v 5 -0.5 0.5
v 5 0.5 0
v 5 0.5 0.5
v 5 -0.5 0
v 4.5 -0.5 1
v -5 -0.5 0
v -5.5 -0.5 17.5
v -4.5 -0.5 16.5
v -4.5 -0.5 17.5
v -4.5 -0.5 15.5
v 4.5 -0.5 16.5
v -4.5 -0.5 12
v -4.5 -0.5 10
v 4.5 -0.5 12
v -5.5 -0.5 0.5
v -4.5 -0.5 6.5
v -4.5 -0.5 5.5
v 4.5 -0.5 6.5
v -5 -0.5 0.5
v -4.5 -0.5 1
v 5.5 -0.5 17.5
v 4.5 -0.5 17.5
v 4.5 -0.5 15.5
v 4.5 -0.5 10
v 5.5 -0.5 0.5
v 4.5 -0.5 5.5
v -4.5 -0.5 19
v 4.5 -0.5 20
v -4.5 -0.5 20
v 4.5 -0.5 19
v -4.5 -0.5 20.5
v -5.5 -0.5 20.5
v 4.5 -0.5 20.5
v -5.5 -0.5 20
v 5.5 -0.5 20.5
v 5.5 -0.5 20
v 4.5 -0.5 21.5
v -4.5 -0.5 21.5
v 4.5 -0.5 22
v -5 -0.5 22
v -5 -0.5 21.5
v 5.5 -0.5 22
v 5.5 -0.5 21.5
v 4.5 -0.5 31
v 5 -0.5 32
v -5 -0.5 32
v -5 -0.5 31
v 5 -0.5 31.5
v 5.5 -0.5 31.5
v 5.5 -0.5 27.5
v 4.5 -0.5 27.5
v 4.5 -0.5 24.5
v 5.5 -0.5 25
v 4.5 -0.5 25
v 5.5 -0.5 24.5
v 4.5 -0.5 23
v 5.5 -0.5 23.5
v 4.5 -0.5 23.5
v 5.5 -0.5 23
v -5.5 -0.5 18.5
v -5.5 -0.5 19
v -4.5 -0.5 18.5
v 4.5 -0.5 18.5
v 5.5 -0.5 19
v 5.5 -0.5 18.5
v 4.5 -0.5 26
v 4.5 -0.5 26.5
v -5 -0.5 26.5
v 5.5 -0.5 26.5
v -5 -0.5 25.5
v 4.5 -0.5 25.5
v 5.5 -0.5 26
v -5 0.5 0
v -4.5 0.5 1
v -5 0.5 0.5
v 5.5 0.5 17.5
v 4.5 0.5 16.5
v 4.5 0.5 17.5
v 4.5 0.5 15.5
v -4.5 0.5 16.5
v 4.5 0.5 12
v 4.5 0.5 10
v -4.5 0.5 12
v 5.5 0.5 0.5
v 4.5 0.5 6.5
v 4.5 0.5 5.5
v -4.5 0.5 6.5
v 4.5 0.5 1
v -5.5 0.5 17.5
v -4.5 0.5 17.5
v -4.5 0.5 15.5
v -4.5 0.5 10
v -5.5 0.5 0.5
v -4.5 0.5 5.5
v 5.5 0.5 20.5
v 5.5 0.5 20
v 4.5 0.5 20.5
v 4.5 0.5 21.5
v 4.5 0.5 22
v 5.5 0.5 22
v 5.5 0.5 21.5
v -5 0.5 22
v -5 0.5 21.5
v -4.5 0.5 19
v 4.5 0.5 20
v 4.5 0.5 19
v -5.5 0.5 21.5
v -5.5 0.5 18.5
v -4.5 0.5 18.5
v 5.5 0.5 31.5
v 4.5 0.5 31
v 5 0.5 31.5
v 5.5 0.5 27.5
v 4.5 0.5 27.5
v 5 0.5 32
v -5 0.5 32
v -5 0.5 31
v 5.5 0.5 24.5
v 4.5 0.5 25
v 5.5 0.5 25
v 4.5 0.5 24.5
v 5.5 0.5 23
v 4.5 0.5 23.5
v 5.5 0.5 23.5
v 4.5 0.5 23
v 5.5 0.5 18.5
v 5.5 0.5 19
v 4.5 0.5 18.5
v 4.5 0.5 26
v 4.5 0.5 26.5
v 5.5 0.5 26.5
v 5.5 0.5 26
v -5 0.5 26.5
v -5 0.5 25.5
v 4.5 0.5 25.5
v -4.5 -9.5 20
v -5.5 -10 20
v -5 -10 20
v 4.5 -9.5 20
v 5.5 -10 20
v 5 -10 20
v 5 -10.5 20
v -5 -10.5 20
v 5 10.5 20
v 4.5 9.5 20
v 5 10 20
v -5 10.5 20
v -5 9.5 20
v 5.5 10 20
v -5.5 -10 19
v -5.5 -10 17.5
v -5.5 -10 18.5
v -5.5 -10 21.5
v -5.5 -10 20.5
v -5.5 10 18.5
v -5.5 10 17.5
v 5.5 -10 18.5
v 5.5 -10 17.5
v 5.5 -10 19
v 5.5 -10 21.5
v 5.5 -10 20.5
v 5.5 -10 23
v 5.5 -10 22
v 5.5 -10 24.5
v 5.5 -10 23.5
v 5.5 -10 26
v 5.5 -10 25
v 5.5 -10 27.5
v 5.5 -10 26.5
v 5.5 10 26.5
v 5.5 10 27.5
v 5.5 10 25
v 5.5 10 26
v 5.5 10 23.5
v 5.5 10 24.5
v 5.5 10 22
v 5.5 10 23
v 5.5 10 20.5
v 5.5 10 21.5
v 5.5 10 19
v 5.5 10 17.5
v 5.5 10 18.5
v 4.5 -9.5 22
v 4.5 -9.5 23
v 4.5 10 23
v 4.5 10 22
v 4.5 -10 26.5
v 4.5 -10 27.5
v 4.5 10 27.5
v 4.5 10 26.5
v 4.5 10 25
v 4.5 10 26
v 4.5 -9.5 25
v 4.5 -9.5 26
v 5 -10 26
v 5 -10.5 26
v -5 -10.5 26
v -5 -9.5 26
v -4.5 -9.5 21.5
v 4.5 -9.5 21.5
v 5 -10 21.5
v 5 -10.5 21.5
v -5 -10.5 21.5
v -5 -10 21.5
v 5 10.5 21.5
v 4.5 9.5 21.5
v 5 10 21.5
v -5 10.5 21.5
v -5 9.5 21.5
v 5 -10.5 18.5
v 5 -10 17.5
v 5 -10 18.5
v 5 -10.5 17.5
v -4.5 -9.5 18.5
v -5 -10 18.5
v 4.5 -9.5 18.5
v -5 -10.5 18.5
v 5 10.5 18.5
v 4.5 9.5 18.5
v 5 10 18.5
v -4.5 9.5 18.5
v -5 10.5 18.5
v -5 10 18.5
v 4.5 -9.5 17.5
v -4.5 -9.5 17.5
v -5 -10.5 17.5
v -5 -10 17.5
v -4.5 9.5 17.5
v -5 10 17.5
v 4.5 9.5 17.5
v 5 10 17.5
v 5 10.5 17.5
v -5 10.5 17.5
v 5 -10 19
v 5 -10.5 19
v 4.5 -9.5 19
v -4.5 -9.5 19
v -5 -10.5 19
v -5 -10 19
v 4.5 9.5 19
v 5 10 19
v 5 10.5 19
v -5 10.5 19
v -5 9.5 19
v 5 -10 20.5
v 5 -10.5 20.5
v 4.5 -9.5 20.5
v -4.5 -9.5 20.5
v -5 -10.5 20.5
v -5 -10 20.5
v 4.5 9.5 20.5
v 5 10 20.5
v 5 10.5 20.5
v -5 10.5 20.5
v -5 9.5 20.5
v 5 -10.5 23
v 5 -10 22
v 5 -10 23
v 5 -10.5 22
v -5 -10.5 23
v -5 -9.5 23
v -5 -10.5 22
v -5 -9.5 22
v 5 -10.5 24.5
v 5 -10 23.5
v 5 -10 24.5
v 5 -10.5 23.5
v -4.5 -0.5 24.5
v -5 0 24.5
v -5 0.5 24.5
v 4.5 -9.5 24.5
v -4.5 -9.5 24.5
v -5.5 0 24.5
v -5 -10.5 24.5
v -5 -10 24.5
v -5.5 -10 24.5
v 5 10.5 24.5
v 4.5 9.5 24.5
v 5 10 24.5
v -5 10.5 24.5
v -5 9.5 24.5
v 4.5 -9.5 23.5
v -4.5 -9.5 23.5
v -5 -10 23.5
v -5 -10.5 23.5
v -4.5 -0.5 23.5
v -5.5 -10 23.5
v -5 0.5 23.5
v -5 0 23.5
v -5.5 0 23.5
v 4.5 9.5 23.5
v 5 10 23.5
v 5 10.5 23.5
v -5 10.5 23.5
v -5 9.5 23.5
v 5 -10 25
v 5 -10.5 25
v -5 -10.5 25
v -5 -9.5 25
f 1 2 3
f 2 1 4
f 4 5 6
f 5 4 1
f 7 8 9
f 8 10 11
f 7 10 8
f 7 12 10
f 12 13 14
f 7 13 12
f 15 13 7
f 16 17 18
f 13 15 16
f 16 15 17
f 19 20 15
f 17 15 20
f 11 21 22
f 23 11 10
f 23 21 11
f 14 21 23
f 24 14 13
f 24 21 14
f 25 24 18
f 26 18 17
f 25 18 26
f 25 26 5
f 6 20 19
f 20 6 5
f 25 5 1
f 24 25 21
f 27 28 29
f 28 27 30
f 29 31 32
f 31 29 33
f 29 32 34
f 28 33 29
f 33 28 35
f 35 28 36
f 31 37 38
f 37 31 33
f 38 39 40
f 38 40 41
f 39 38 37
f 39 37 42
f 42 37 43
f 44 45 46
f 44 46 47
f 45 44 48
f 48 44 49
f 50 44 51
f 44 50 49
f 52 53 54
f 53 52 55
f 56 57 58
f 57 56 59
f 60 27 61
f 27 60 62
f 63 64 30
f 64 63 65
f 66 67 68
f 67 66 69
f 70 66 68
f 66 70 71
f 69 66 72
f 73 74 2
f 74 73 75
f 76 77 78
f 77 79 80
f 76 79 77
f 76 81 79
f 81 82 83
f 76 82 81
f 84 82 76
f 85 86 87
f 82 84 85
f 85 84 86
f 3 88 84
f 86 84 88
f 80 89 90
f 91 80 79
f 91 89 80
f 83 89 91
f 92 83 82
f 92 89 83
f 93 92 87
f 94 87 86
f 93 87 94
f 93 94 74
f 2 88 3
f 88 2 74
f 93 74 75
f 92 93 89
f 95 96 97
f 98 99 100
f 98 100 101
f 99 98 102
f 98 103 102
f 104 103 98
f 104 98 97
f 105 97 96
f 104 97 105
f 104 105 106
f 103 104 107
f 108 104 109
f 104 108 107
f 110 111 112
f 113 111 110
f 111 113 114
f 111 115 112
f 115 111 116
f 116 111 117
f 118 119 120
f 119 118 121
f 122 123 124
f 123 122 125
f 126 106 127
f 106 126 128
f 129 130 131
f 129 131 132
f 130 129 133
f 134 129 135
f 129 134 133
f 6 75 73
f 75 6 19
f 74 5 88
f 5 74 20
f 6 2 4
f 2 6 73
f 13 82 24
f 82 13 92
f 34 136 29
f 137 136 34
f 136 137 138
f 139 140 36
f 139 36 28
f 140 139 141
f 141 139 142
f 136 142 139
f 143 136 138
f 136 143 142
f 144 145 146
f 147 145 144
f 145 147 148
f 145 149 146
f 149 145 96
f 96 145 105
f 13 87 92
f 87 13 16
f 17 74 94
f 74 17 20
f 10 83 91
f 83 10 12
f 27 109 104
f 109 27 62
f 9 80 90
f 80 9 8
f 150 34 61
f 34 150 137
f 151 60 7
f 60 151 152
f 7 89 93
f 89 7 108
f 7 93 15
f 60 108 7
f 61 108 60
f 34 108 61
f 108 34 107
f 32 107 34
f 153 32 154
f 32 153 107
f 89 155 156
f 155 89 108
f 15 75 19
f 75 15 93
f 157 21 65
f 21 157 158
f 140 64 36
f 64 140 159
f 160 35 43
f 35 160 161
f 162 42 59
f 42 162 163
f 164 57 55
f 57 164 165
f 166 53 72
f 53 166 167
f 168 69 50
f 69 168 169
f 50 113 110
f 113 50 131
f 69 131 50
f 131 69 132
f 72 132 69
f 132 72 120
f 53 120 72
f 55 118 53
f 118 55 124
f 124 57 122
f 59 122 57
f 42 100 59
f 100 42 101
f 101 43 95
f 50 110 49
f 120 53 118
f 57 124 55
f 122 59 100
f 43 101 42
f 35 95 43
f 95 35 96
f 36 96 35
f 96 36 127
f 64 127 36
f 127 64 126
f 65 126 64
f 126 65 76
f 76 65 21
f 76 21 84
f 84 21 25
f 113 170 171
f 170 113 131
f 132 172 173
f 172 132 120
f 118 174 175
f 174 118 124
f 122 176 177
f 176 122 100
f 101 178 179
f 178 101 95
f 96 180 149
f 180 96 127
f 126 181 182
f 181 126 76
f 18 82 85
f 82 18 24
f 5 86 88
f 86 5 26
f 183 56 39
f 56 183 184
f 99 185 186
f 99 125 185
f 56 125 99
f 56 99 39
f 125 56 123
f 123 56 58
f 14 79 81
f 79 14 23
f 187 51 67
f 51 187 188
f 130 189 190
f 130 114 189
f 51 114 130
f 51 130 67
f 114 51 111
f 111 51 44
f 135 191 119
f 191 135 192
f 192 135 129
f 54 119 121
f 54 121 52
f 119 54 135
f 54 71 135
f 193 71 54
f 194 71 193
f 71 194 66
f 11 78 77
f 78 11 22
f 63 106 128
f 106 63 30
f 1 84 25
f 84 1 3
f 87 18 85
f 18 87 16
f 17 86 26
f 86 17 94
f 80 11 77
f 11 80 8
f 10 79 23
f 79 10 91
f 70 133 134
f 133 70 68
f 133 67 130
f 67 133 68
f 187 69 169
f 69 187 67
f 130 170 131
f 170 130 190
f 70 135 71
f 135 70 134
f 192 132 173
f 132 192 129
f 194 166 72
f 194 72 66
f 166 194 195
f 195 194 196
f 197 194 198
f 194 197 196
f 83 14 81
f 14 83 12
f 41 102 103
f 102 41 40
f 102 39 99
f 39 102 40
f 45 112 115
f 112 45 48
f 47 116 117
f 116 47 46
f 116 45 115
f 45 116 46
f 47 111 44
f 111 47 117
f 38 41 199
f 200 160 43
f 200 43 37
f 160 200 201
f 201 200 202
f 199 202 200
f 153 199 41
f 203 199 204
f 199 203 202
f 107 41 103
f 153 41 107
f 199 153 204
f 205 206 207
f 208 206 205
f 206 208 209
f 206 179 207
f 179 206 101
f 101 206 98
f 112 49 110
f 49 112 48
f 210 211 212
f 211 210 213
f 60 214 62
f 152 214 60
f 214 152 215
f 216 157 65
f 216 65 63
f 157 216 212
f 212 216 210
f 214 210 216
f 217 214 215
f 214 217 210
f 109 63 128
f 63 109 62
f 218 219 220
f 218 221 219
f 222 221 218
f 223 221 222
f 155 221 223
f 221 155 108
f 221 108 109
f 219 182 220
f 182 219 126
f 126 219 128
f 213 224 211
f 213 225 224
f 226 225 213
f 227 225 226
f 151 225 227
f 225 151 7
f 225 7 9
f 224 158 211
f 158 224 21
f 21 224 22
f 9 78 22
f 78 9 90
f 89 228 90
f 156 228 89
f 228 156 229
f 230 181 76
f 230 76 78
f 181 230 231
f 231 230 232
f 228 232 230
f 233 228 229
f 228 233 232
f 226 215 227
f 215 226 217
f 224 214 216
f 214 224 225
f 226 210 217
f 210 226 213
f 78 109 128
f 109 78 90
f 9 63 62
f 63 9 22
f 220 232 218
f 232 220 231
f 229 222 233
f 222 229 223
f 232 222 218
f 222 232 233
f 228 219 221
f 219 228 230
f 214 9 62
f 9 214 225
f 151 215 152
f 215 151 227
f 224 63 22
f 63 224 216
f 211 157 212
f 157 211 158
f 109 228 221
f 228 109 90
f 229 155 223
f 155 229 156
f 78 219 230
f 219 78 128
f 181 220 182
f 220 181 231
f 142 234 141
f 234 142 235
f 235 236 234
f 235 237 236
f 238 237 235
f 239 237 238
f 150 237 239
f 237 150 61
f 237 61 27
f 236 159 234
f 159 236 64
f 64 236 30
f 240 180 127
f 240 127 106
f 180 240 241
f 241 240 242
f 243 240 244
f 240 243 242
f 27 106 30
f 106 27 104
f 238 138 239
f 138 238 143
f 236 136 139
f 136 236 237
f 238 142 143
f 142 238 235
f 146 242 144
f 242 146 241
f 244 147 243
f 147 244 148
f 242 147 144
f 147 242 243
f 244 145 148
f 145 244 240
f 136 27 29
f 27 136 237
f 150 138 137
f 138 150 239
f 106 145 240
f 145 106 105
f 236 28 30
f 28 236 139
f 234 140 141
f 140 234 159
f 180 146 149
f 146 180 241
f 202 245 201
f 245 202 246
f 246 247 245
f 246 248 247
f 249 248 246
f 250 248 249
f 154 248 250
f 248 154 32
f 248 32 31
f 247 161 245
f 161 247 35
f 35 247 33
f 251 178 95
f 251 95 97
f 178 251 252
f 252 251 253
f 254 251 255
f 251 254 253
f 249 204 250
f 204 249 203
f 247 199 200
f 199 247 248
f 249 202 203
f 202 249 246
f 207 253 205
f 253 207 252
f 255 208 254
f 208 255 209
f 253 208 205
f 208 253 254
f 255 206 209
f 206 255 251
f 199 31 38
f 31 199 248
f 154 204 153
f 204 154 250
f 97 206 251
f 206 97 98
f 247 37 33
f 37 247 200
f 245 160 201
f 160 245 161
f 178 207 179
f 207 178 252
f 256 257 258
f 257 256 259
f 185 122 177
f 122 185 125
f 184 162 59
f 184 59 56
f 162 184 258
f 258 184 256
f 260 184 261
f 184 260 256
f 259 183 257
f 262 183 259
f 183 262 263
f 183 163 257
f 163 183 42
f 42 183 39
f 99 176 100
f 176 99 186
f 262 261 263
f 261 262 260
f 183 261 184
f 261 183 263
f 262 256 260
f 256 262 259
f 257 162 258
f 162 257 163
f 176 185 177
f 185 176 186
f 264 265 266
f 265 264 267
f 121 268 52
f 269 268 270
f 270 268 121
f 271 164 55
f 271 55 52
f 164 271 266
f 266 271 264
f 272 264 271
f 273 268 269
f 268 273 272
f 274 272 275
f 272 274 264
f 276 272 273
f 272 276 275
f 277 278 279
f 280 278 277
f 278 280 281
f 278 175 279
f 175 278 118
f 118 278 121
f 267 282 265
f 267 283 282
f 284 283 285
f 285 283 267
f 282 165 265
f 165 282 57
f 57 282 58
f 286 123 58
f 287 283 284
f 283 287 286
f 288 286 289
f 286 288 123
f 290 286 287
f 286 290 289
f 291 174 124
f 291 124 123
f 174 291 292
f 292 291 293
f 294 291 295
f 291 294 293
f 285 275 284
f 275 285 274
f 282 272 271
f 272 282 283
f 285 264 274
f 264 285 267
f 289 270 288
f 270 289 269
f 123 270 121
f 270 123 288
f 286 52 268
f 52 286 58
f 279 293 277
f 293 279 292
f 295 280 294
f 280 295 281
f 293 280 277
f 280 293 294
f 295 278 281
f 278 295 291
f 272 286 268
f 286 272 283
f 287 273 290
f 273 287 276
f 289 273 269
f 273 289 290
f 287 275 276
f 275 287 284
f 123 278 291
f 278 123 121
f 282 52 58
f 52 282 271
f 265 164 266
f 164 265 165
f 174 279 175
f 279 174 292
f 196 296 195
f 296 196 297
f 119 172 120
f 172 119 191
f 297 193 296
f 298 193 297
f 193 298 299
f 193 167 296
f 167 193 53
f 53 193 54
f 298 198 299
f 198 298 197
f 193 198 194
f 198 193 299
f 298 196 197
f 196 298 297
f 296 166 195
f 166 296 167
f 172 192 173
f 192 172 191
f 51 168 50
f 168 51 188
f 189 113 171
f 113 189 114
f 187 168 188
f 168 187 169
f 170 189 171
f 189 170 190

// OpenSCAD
translate([0,0,5.5])translate([0,0,5]) rotate([90,0,0]) union(){
translate([0,-10,0]) cube([10,1,1], center=true);translate([0,0,0]) cube([10,1,1], center=true);translate([0,10,0]) cube([10,1,1], center=true);translate([-5,-5,0]) cube([1,10,1], center=true);translate([5,-5,0]) cube([1,10,1], center=true);translate([5,5,0]) cube([1,10,1], center=true);}


translate([0,0,11.0])translate([0,0,5]) rotate([90,0,0]) union(){
translate([0,-10,0]) cube([10,1,1], center=true);translate([0,0,0]) cube([10,1,1], center=true);translate([0,10,0]) cube([10,1,1], center=true);translate([-5,-5,0]) cube([1,10,1], center=true);translate([5,-5,0]) cube([1,10,1], center=true);translate([5,5,0]) cube([1,10,1], center=true);}


translate([0,0,16.5])translate([0,0,5]) rotate([90,0,0]) union(){
translate([0,-10,0]) cube([10,1,1], center=true);translate([0,0,0]) cube([10,1,1], center=true);translate([0,10,0]) cube([10,1,1], center=true);translate([-5,-5,0]) cube([1,10,1], center=true);translate([5,-5,0]) cube([1,10,1], center=true);translate([5,5,0]) cube([1,10,1], center=true);}


translate([0,0,18.0]) union(){
translate([0,-10,0]) cube([10,1,1], center=true);translate([0,0,0]) cube([10,1,1], center=true);translate([0,10,0]) cube([10,1,1], center=true);translate([-5,-5,0]) cube([1,10,1], center=true);translate([5,-5,0]) cube([1,10,1], center=true);translate([-5,5,0]) cube([1,10,1], center=true);translate([5,5,0]) cube([1,10,1], center=true);}


translate([0,0,19.5]) union(){
translate([0,-10,0]) cube([10,1,1], center=true);translate([0,0,0]) cube([10,1,1], center=true);translate([0,10,0]) cube([10,1,1], center=true);translate([-5,-5,0]) cube([1,10,1], center=true);translate([5,-5,0]) cube([1,10,1], center=true);translate([5,5,0]) cube([1,10,1], center=true);}


translate([0,0,21.0]) union(){
translate([0,-10,0]) cube([10,1,1], center=true);translate([0,0,0]) cube([10,1,1], center=true);translate([0,10,0]) cube([10,1,1], center=true);translate([-5,-5,0]) cube([1,10,1], center=true);translate([5,-5,0]) cube([1,10,1], center=true);translate([5,5,0]) cube([1,10,1], center=true);}


translate([0,0,22.5]) union(){
translate([0,-10,0]) cube([10,1,1], center=true);translate([5,-5,0]) cube([1,10,1], center=true);translate([5,5,0]) cube([1,10,1], center=true);}


translate([0,0,24.0]) union(){
translate([0,-10,0]) cube([10,1,1], center=true);translate([0,0,0]) cube([10,1,1], center=true);translate([0,10,0]) cube([10,1,1], center=true);translate([-5,-5,0]) cube([1,10,1], center=true);translate([5,-5,0]) cube([1,10,1], center=true);translate([5,5,0]) cube([1,10,1], center=true);}


translate([0,0,25.5]) union(){
translate([0,-10,0]) cube([10,1,1], center=true);translate([5,-5,0]) cube([1,10,1], center=true);translate([5,5,0]) cube([1,10,1], center=true);}


translate([0,0,27.0]) union(){
translate([5,-5,0]) cube([1,10,1], center=true);translate([5,5,0]) cube([1,10,1], center=true);}
